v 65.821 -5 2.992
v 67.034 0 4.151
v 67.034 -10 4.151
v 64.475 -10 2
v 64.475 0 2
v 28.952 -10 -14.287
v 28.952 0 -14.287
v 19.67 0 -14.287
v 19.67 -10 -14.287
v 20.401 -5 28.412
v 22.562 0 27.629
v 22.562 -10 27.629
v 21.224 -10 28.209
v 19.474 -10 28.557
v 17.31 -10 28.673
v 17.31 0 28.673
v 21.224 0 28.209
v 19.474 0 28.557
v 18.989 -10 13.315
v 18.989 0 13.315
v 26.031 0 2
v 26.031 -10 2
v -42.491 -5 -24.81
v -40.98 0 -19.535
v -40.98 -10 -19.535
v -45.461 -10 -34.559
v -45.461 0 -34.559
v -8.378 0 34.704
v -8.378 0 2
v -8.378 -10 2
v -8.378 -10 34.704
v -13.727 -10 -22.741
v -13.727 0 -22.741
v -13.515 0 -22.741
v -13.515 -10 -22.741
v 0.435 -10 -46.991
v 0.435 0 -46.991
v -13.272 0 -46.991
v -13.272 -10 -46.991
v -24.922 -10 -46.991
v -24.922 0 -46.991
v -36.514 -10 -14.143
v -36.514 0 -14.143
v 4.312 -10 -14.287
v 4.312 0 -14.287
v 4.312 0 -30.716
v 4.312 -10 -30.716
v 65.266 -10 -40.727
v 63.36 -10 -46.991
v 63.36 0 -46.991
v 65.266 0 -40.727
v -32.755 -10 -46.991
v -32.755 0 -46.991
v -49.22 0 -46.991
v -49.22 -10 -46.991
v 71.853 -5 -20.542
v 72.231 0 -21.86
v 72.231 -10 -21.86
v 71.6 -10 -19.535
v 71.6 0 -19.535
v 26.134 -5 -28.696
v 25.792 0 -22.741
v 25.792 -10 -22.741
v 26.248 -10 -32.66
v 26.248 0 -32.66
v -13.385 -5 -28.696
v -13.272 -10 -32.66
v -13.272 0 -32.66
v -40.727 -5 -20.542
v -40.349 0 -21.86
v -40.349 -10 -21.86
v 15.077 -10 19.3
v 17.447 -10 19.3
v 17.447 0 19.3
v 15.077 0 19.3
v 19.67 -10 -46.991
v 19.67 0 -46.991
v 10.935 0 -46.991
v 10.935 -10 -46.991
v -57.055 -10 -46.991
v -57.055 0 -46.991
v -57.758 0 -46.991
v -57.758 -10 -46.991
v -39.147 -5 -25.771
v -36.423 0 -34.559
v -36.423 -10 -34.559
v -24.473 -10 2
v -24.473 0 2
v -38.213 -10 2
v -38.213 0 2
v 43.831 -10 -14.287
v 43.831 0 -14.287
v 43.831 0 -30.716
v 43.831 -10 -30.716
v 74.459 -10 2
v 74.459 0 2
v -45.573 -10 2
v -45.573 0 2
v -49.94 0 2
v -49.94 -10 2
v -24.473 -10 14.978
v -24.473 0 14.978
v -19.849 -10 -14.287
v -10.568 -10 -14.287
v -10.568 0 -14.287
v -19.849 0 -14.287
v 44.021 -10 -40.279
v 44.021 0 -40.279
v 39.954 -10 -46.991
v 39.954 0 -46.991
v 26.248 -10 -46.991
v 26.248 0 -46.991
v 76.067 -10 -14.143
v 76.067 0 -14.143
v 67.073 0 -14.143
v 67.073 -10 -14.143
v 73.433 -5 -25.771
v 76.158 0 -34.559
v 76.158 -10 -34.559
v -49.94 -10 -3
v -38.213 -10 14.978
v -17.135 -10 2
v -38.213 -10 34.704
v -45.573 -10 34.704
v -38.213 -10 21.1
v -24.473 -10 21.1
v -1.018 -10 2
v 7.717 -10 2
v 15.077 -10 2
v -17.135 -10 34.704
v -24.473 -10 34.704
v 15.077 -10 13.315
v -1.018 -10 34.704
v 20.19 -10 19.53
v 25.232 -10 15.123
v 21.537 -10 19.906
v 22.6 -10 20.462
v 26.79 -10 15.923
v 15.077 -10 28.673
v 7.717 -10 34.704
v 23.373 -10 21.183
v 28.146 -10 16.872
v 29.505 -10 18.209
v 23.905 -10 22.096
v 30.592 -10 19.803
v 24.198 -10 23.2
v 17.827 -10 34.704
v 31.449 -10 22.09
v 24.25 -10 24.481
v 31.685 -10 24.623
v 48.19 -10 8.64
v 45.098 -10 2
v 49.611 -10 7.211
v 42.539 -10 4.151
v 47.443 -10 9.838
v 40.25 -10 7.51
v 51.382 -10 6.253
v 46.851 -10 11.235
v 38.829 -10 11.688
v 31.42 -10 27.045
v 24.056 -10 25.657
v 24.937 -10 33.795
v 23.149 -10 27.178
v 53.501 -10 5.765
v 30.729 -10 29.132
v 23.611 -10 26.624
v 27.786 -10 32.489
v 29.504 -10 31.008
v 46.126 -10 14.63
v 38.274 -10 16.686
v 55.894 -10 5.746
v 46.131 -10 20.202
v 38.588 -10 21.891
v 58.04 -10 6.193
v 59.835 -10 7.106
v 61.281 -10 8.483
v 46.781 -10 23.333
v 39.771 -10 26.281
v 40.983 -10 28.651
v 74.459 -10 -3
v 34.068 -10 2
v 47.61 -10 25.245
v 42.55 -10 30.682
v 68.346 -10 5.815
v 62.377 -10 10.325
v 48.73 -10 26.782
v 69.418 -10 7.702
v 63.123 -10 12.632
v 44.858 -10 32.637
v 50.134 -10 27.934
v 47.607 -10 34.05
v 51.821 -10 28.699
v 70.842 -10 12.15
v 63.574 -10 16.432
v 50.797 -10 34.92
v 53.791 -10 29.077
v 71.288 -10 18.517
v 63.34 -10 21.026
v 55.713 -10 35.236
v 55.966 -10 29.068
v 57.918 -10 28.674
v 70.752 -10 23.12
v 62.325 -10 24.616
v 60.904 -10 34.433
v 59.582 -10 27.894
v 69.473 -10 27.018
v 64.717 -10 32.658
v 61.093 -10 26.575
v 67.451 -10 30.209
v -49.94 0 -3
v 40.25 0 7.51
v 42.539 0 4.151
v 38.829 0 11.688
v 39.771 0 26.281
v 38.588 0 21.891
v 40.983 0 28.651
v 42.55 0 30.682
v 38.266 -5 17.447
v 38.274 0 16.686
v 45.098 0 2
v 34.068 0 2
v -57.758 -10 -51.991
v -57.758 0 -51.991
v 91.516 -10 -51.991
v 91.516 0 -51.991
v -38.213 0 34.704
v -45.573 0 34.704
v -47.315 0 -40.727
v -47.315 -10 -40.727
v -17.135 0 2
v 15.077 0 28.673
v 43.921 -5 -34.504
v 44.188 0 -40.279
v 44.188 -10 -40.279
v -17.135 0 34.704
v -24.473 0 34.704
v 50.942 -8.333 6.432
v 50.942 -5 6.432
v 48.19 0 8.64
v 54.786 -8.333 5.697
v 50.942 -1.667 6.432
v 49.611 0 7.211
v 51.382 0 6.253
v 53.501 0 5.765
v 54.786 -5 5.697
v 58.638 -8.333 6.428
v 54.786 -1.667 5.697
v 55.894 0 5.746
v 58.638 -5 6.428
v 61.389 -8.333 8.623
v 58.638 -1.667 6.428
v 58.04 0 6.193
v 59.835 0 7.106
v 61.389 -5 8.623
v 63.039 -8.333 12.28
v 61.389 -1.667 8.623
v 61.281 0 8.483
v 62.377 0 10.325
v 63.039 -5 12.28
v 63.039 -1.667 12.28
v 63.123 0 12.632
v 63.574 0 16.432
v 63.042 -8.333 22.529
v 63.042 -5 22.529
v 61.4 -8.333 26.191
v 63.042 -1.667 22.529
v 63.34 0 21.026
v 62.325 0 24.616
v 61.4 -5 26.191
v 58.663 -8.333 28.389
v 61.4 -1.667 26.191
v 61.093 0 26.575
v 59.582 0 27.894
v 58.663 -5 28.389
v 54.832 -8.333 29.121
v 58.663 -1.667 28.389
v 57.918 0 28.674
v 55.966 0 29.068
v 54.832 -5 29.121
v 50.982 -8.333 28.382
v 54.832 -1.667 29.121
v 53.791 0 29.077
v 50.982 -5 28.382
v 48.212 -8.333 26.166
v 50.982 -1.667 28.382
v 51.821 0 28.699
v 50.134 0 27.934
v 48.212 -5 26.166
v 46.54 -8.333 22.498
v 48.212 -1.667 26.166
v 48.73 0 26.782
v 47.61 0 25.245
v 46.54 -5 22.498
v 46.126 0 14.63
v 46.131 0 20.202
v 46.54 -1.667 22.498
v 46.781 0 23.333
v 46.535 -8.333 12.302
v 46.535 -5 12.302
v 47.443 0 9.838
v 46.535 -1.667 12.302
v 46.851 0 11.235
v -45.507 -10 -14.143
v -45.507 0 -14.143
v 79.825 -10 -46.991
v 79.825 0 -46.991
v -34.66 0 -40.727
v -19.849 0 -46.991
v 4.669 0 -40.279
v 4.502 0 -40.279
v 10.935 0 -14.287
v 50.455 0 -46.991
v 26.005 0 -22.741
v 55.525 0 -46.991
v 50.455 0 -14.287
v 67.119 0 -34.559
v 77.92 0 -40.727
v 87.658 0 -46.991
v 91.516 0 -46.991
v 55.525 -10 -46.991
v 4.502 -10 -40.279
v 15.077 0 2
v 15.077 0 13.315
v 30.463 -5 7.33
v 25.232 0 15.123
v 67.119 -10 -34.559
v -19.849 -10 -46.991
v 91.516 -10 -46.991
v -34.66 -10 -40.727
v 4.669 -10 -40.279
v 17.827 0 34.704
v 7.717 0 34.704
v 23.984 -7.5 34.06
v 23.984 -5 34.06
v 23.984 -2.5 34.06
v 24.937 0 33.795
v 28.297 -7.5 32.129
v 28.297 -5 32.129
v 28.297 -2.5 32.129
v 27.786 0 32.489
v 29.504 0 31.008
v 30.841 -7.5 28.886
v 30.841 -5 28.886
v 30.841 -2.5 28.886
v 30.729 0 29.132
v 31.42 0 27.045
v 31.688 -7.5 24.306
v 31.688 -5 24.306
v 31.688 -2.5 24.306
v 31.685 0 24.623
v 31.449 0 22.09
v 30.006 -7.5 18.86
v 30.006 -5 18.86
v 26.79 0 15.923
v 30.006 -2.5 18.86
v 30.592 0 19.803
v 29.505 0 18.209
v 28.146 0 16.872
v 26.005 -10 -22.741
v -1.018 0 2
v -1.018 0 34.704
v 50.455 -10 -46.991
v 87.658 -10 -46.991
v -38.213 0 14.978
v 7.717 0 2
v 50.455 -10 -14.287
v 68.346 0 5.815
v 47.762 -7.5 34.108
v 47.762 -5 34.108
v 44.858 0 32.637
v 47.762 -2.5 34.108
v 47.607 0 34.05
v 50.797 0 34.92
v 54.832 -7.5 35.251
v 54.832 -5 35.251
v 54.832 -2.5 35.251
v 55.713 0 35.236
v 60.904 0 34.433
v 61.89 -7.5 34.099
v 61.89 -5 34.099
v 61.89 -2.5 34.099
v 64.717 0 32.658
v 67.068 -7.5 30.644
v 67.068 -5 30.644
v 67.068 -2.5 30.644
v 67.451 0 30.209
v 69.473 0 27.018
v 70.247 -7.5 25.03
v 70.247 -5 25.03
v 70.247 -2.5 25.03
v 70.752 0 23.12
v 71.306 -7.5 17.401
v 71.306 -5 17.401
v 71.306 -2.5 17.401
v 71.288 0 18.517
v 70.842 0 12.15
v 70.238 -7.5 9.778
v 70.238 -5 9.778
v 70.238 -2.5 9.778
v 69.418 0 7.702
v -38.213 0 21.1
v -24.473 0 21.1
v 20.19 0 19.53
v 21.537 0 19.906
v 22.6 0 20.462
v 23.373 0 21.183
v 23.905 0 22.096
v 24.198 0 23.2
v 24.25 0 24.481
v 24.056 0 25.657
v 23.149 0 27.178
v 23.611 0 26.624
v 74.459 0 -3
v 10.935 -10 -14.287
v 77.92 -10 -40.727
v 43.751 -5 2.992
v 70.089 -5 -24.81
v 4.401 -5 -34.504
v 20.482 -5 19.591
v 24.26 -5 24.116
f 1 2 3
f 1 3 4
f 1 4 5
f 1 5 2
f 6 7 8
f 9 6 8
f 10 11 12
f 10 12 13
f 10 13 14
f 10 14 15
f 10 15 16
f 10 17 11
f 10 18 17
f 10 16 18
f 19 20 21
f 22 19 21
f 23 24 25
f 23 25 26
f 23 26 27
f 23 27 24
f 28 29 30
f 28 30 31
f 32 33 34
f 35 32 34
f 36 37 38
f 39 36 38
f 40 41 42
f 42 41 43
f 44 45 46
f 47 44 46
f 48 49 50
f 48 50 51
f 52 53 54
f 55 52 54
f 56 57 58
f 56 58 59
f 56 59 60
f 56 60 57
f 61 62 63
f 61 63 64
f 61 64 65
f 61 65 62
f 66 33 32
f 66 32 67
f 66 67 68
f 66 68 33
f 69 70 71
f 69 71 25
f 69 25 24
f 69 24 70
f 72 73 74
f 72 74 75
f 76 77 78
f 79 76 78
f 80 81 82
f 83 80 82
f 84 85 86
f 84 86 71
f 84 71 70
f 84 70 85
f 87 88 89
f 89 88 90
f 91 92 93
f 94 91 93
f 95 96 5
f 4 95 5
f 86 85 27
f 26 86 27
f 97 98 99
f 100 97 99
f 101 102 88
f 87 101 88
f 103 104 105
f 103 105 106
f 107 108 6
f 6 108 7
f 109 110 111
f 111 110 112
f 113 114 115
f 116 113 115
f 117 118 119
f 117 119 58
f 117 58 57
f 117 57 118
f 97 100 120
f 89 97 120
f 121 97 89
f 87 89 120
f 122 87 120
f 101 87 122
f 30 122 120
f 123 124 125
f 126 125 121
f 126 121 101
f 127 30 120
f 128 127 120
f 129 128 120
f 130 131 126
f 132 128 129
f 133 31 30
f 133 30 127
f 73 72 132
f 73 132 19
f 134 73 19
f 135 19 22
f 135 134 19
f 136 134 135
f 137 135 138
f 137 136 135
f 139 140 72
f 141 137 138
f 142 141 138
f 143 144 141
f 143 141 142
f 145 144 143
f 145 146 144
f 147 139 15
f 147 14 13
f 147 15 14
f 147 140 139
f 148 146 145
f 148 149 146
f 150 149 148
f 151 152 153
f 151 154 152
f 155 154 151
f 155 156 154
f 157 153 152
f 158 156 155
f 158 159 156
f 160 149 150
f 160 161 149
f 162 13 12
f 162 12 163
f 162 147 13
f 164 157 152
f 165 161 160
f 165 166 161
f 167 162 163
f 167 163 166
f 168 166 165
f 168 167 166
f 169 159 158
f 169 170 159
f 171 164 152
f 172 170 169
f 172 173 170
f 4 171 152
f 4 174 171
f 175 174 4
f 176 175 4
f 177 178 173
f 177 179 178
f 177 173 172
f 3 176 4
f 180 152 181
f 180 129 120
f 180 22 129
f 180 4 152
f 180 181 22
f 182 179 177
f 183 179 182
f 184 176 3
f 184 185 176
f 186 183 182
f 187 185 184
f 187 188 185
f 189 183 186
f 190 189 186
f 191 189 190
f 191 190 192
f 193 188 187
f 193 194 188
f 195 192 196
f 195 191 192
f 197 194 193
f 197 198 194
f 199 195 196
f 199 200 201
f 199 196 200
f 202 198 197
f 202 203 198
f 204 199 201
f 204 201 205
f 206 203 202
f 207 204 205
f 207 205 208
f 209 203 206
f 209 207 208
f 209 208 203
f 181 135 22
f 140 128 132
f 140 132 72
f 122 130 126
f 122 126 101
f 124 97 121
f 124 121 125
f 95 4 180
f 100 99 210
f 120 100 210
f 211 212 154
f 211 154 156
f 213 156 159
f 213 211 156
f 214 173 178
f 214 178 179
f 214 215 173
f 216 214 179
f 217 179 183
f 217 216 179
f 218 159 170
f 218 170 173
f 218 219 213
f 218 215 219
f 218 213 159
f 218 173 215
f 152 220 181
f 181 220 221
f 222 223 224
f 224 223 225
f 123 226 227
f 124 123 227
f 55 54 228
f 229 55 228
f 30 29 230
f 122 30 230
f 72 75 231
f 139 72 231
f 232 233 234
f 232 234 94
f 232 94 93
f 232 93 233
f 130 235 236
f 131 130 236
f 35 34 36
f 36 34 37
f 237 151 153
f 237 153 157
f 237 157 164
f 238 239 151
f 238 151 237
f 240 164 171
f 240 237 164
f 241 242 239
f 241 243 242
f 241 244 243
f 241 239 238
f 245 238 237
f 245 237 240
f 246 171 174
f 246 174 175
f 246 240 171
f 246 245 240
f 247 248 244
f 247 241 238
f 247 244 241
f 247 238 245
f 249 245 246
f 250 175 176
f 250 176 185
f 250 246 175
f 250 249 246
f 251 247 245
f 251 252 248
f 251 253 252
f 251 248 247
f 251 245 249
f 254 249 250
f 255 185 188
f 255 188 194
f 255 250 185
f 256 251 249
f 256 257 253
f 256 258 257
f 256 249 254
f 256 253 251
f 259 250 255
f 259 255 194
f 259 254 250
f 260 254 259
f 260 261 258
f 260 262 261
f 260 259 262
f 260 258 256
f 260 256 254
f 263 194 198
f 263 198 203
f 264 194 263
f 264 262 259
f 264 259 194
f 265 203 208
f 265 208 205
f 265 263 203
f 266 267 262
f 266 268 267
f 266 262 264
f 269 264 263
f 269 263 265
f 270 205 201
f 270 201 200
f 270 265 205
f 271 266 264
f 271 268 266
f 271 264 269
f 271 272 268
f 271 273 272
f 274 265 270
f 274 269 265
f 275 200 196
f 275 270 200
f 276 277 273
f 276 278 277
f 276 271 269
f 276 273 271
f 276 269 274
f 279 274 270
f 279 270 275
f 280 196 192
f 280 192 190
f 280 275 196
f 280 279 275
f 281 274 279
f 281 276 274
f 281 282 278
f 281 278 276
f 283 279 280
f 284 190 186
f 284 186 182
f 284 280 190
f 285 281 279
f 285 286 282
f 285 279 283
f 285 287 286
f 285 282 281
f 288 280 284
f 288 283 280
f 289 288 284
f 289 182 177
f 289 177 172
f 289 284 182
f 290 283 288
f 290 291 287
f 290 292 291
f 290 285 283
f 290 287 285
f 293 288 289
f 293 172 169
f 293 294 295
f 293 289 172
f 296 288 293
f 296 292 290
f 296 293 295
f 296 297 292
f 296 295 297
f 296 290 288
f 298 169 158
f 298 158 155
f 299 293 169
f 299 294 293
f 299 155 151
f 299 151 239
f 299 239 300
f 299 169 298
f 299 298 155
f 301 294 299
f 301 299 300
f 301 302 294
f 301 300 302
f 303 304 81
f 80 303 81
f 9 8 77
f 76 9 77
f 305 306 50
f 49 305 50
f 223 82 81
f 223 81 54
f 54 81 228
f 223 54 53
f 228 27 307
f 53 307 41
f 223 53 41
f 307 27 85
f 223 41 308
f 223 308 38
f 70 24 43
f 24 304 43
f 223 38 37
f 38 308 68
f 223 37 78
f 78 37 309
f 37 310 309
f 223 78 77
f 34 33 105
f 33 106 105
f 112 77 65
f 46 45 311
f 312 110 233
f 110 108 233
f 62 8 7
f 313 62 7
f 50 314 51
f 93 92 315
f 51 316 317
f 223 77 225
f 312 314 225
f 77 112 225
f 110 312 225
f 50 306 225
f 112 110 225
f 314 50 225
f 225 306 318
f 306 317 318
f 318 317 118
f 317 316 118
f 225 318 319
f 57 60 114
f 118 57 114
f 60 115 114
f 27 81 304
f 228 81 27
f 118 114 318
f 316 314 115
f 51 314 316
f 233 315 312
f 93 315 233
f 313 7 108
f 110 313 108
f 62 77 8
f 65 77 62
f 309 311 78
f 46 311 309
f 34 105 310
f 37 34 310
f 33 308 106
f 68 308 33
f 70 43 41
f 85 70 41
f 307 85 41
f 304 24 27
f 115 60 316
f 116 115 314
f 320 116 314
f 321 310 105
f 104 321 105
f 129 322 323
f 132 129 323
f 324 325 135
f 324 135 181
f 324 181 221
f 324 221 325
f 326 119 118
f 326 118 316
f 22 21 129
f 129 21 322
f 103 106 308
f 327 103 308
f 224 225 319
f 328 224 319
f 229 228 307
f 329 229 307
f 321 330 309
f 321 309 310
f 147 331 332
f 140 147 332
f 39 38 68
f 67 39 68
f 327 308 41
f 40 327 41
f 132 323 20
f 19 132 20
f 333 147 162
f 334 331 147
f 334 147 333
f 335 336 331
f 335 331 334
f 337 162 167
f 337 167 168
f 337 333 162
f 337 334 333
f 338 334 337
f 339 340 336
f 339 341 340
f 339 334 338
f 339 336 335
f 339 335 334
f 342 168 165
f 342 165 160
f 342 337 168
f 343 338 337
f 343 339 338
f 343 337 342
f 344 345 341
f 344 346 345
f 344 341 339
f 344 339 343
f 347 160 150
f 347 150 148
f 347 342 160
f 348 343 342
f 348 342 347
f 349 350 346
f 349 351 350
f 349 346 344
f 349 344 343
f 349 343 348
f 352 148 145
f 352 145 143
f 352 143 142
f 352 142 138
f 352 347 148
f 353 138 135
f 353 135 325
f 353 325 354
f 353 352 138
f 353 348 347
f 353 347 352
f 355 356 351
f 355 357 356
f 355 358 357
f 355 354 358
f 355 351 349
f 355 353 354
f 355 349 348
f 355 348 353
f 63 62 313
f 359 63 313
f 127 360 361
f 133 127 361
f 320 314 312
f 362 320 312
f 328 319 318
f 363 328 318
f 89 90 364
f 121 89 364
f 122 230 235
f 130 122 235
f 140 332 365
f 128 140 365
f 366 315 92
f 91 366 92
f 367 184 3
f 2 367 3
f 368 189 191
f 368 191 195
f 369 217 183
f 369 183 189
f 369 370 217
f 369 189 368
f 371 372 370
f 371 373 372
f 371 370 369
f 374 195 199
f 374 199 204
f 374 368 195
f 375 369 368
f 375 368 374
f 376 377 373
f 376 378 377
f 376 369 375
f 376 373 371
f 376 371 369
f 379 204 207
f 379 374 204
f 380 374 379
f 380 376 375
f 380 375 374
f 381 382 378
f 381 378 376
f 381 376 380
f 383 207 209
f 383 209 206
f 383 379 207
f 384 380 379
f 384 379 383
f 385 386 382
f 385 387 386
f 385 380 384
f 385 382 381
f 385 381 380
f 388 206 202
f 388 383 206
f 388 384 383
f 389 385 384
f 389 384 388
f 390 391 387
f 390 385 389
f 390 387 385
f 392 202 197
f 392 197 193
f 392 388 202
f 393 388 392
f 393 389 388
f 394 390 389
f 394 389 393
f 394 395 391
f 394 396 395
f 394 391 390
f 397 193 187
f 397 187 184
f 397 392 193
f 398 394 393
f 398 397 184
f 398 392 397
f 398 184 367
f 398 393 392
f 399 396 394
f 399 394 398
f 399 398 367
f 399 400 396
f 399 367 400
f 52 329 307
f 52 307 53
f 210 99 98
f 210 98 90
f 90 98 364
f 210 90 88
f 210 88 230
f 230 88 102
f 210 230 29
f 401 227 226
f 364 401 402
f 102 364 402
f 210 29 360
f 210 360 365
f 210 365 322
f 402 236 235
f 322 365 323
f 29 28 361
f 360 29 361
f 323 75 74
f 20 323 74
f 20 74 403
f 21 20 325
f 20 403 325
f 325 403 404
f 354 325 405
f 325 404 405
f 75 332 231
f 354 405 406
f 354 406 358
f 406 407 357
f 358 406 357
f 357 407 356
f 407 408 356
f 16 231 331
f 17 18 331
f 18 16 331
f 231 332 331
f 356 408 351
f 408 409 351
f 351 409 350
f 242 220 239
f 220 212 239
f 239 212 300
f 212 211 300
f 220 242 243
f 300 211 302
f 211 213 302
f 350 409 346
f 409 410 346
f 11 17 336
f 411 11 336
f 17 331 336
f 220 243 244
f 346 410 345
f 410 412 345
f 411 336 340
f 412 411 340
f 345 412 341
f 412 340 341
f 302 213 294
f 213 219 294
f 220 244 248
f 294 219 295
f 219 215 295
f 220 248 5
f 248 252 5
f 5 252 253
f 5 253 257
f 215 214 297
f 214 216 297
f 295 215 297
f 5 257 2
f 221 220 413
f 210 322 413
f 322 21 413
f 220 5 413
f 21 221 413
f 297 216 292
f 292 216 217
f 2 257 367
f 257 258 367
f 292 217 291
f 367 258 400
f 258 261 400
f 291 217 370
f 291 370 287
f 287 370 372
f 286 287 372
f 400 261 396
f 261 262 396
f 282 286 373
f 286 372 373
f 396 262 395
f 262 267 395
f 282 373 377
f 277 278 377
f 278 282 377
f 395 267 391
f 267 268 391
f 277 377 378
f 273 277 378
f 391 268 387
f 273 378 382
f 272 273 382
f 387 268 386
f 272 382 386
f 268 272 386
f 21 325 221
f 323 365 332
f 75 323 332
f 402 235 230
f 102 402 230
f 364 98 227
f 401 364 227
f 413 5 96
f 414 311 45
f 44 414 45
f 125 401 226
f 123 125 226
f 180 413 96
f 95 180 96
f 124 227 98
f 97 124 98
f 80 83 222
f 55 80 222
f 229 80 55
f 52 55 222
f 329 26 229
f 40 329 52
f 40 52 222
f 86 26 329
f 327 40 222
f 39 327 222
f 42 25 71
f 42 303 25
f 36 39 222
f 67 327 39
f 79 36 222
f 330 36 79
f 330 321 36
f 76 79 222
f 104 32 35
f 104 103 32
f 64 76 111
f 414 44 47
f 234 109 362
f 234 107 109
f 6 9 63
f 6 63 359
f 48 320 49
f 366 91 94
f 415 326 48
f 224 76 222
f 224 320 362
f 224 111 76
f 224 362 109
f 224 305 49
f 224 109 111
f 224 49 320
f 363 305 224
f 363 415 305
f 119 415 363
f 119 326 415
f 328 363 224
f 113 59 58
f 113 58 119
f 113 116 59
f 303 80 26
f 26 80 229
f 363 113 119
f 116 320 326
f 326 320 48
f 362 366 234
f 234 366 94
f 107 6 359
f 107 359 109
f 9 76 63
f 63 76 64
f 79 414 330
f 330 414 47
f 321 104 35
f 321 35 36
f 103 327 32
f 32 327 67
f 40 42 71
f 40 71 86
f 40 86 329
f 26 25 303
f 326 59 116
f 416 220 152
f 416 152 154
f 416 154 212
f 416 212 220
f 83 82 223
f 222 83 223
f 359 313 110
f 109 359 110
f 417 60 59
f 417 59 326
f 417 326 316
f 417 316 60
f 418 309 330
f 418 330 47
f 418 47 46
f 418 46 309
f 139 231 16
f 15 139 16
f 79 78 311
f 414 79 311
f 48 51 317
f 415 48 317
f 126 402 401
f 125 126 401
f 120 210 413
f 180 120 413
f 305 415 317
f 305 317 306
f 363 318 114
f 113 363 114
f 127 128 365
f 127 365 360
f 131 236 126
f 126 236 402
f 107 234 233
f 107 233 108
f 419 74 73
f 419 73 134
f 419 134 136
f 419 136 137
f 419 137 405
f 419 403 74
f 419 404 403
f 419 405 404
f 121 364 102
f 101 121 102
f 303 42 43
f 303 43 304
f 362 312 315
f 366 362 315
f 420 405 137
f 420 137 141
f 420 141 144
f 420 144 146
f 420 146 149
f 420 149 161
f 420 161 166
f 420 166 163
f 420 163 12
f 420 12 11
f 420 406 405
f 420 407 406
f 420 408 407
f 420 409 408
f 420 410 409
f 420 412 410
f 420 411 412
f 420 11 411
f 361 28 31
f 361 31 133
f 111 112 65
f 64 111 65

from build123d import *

# Parameters (mm, degrees)
F0_W     = 7.3600260417
F0_H     = 2
F0_W_2   = 7.3372395833
F0_H_2   = 32.7037760417
F1_DEPTH = 10
F2_W     = 6.5776909722
F2_H     = 2
F3_DEPTH = 10


with BuildPart() as f1:
    # F0 (on Front) → F1 (new body)
    with BuildSketch(Plane.XZ):
        Polygon((-45.5729096715, 34.7037760417), (-45.5729096715, 2), (-38.2128836299, 2), (-38.2128836299, 14.9782986111), (-24.4726492549, 14.9782986111), (-24.4726492549, 2), (-17.1354096715, 2), (-17.1354096715, 34.7037760417), (-24.4726492549, 34.7037760417), (-24.4726492549, 21.1002604167), (-38.2128836299, 21.1002604167), (-38.2128836299, 34.7037760417), align=None)
        with Locations((-41.8928966507, 1)):
            Rectangle(F0_W, F0_H)
        with BuildLine():
            Line((-45.5729096715, 2), (-49.9403141854, 2))
            Line((-49.9403141854, 2), (-49.9403141854, -3))
            Line((-49.9403141854, -3), (74.4585573424, -3))
            Line((74.4585573424, -3), (74.4585573424, 2))
            Line((74.4585573424, 2), (64.4747883987, 2))
            add(Edge.make_bspline(
                [(64.4747883987, 2), (60.6217212829, -0.478515625), (54.7862483146, -0.478515625)],
                knots=[0.2683031445, 0.2683031445, 0.2683031445, 1, 1, 1], degree=2))
            add(Edge.make_bspline(
                [(54.7862483146, -0.478515625), (48.9507753462, -0.478515625), (45.0977082305, 2)],
                knots=[0, 0, 0, 0.7316968555, 0.7316968555, 0.7316968555], degree=2))
            Line((45.0977082305, 2), (34.0683879111, 2))
            add(Edge.make_bspline(
                [(34.0683879111, 2), (34.8978609429, 0.7827176635), (35.4405451896, 0)],
                knots=[0.770999175, 0.770999175, 0.770999175, 1, 1, 1], degree=2))
            Line((35.4405451896, 0), (27.2753976201, 0))
            Line((27.2753976201, 0), (26.0306742887, 2))
            Line((26.0306742887, 2), (15.0770469257, 2))
            Line((15.0770469257, 2), (15.0770469257, 0))
            Line((15.0770469257, 0), (7.717020884, 0))
            Line((7.717020884, 0), (7.717020884, 2))
            Line((7.717020884, 2), (-1.0177881438, 2))
            Line((-1.0177881438, 2), (-1.0177881438, 0))
            Line((-1.0177881438, 0), (-8.3778141854, 0))
            Line((-8.3778141854, 0), (-8.3778141854, 2))
            Line((-8.3778141854, 2), (-17.1354096715, 2))
            Line((-17.1354096715, 2), (-17.1354096715, 0))
            Line((-17.1354096715, 0), (-24.4726492549, 0))
            Line((-24.4726492549, 0), (-24.4726492549, 2))
            Line((-24.4726492549, 2), (-38.2128836299, 2))
            Line((-38.2128836299, 2), (-38.2128836299, 0))
            Line((-38.2128836299, 0), (-45.5729096715, 0))
            Line((-45.5729096715, 0), (-45.5729096715, 2))
        make_face()
        with Locations((-20.8040294632, 1)):
            Rectangle(F0_W_2, F0_H)
        with Locations((-4.6978011646, 18.3518880208)):
            Rectangle(F0_W, F0_H_2)
        with Locations((-4.6978011646, 1)):
            Rectangle(F0_W, F0_H)
        with BuildLine():
            Line((26.0306742887, 2), (34.0683879111, 2))
            add(Edge.make_bspline(
                [(25.2322118562, 15.1226128472), (31.2757210146, 6.0983419044), (34.0683879111, 2)],
                knots=[0, 0, 0, 0.770999175, 0.770999175, 0.770999175], degree=2))
            add(Edge.make_bspline(
                [(30.0059748771, 18.8595920139), (28.3235747035, 16.474609375), (25.2322118562, 15.1226128472)],
                knots=[0, 0, 0, 1, 1, 1], degree=2))
            add(Edge.make_bspline(
                [(31.6883750507, 24.3055555556), (31.6883750507, 21.2445746528), (30.0059748771, 18.8595920139)],
                knots=[0, 0, 0, 1, 1, 1], degree=2))
            add(Edge.make_bspline(
                [(28.2969905021, 32.12890625), (31.6883750507, 29.5540364583), (31.6883750507, 24.3055555556)],
                knots=[0, 0, 0, 1, 1, 1], degree=2))
            add(Edge.make_bspline(
                [(17.8266128979, 34.7037760417), (24.9056059535, 34.7037760417), (28.2969905021, 32.12890625)],
                knots=[0, 0, 0, 1, 1, 1], degree=2))
            Line((17.8266128979, 34.7037760417), (7.717020884, 34.7037760417))
            Line((7.717020884, 34.7037760417), (7.717020884, 2))
            Line((7.717020884, 2), (15.0770469257, 2))
            Line((15.0770469257, 2), (15.0770469257, 13.3148871528))
            Line((15.0770469257, 13.3148871528), (18.9887222729, 13.3148871528))
            Line((18.9887222729, 13.3148871528), (26.0306742887, 2))
        make_face()
        with BuildLine():
            Line((17.4468385924, 19.3001302083), (15.0770469257, 19.3001302083))
            Line((15.0770469257, 19.3001302083), (15.0770469257, 28.6729600694))
            Line((15.0770469257, 28.6729600694), (17.3101198424, 28.6729600694))
            add(Edge.make_bspline(
                [(22.5623984882, 27.6285807292), (20.8648073424, 28.6729600694), (17.3101198424, 28.6729600694)],
                knots=[0, 0, 0, 1, 1, 1], degree=2))
            add(Edge.make_bspline(
                [(24.259989634, 24.1156684028), (24.259989634, 26.5842013889), (22.5623984882, 27.6285807292)],
                knots=[0, 0, 0, 1, 1, 1], degree=2))
            add(Edge.make_bspline(
                [(22.6003759187, 20.4622395833), (24.259989634, 21.6243489583), (24.259989634, 24.1156684028)],
                knots=[0, 0, 0, 1, 1, 1], degree=2))
            add(Edge.make_bspline(
                [(17.4468385924, 19.3001302083), (20.9407622035, 19.3001302083), (22.6003759187, 20.4622395833)],
                knots=[0, 0, 0, 1, 1, 1], degree=2))
        make_face(mode=Mode.SUBTRACT)
        with Locations((11.3970339049, 1)):
            Rectangle(F0_W, F0_H)
        with BuildLine():
            add(Edge.make_bspline(
                [(34.0683879111, 2), (34.8978609429, 0.7827176635), (35.4405451896, 0)],
                knots=[0.770999175, 0.770999175, 0.770999175, 1, 1, 1], degree=2))
            Line((34.0683879111, 2), (26.0306742887, 2))
            Line((26.0306742887, 2), (27.2753976201, 0))
            Line((27.2753976201, 0), (35.4405451896, 0))
        make_face()
        with BuildLine():
            Line((45.0977082305, 2), (64.4747883987, 2))
            add(Edge.make_bspline(
                [(67.0339696687, 4.1509331597), (65.8876549643, 2.9088374933), (64.4747883987, 2)],
                knots=[0, 0, 0, 0.2683031445, 0.2683031445, 0.2683031445], degree=2))
            add(Edge.make_bspline(
                [(71.3064306062, 17.4012586806), (71.3064306062, 8.7803819444), (67.0339696687, 4.1509331597)],
                knots=[0, 0, 0, 1, 1, 1], degree=2))
            add(Edge.make_bspline(
                [(67.0681493562, 30.6439887153), (71.3064306062, 26.0373263889), (71.3064306062, 17.4012586806)],
                knots=[0, 0, 0, 1, 1, 1], degree=2))
            add(Edge.make_bspline(
                [(54.8318212312, 35.2506510417), (62.8298681062, 35.2506510417), (67.0681493562, 30.6439887153)],
                knots=[0, 0, 0, 1, 1, 1], degree=2))
            add(Edge.make_bspline(
                [(42.5499201896, 30.6819661458), (46.8337743562, 35.2506510417), (54.8318212312, 35.2506510417)],
                knots=[0, 0, 0, 1, 1, 1], degree=2))
            add(Edge.make_bspline(
                [(38.2660660229, 17.4468315972), (38.2660660229, 26.11328125), (42.5499201896, 30.6819661458)],
                knots=[0, 0, 0, 1, 1, 1], degree=2))
            add(Edge.make_bspline(
                [(42.5385269604, 4.1509331597), (38.2660660229, 8.7803819444), (38.2660660229, 17.4468315972)],
                knots=[0, 0, 0, 1, 1, 1], degree=2))
            add(Edge.make_bspline(
                [(45.0977082305, 2), (43.6848416649, 2.9088374933), (42.5385269604, 4.1509331597)],
                knots=[0.7316968555, 0.7316968555, 0.7316968555, 1, 1, 1], degree=2))
        make_face()
        with BuildLine():
            add(Edge.make_bspline(
                [(45.9830799118, 17.4012586806), (45.9830799118, 11.5831163194), (48.1895686271, 8.6398654514)],
                knots=[0, 0, 0, 1, 1, 1], degree=2))
            add(Edge.make_bspline(
                [(48.2123550854, 26.1664496528), (45.9830799118, 23.2118055556), (45.9830799118, 17.4012586806)],
                knots=[0, 0, 0, 1, 1, 1], degree=2))
            add(Edge.make_bspline(
                [(54.8318212312, 29.12109375), (50.441630259, 29.12109375), (48.2123550854, 26.1664496528)],
                knots=[0, 0, 0, 1, 1, 1], degree=2))
            add(Edge.make_bspline(
                [(63.5894167174, 17.4012586806), (63.5894167174, 29.12109375), (54.8318212312, 29.12109375)],
                knots=[0, 0, 0, 1, 1, 1], degree=2))
            add(Edge.make_bspline(
                [(54.7862483146, 5.6966145833), (63.5894167174, 5.6966145833), (63.5894167174, 17.4012586806)],
                knots=[0, 0, 0, 1, 1, 1], degree=2))
            add(Edge.make_bspline(
                [(48.1895686271, 8.6398654514), (50.3960573424, 5.6966145833), (54.7862483146, 5.6966145833)],
                knots=[0, 0, 0, 1, 1, 1], degree=2))
        make_face(mode=Mode.SUBTRACT)
        with BuildLine():
            add(Edge.make_bspline(
                [(64.4747883987, 2), (60.6217212829, -0.478515625), (54.7862483146, -0.478515625)],
                knots=[0.2683031445, 0.2683031445, 0.2683031445, 1, 1, 1], degree=2))
            Line((64.4747883987, 2), (45.0977082305, 2))
            add(Edge.make_bspline(
                [(54.7862483146, -0.478515625), (48.9507753462, -0.478515625), (45.0977082305, 2)],
                knots=[0, 0, 0, 0.7316968555, 0.7316968555, 0.7316968555], degree=2))
        make_face()
    extrude(amount=F1_DEPTH)


with BuildPart() as f3:
    # F2 (on Front) → F3 (new body)
    with BuildSketch(Plane.XZ):
        Polygon((-45.5068036232, -14.1426085562), (-57.0551840979, -46.9906988339), (-49.2201793381, -46.9906988339), (-47.3145293176, -40.7268099451), (-34.6604494565, -40.7268099451), (-32.7547994361, -46.9906988339), (-24.922410195, -46.9906988339), (-36.5137480676, -14.1426085562), align=None)
        with BuildLine():
            add(Edge.make_bspline(
                [(-36.4226022343, -34.5592752228), (-39.9089303593, -23.3331467506), (-40.3494685538, -21.8596224451)],
                knots=[0, 0, 0, 1, 1, 1], degree=2))
            Line((-36.4226022343, -34.5592752228), (-45.4612307065, -34.5592752228))
            add(Edge.make_bspline(
                [(-40.979893901, -19.5354036951), (-41.7622289704, -22.5735981395), (-45.4612307065, -34.5592752228)],
                knots=[0, 0, 0, 1, 1, 1], degree=2))
            add(Edge.make_bspline(
                [(-40.3494685538, -21.8596224451), (-40.7900067482, -20.3860981395), (-40.979893901, -19.5354036951)],
                knots=[0, 0, 0, 1, 1, 1], degree=2))
        make_face(mode=Mode.SUBTRACT)
        with BuildLine():
            Line((-19.8492515399, -14.2869227923), (-19.8492515399, -46.9906988339))
            Line((-19.8492515399, -46.9906988339), (-13.2715605676, -46.9906988339))
            Line((-13.2715605676, -46.9906988339), (-13.2715605676, -32.6604036951))
            add(Edge.make_bspline(
                [(-13.7272897343, -22.7406988339), (-13.2715605676, -29.6905686256), (-13.2715605676, -32.6604036951)],
                knots=[0, 0, 0, 1, 1, 1], degree=2))
            Line((-13.7272897343, -22.7406988339), (-13.5146161232, -22.7406988339))
            Line((-13.5146161232, -22.7406988339), (0.4347473027, -46.9906988339))
            Line((0.4347473027, -46.9906988339), (10.9352536685, -46.9906988339))
            Line((10.9352536685, -46.9906988339), (10.9352536685, -14.2869227923))
            Line((10.9352536685, -14.2869227923), (4.3119897796, -14.2869227923))
            Line((4.3119897796, -14.2869227923), (4.3119897796, -30.7159592506))
            add(Edge.make_bspline(
                [(4.6689776268, -40.2786762645), (4.3119897796, -33.5110981395), (4.3119897796, -30.7159592506)],
                knots=[0, 0, 0, 1, 1, 1], degree=2))
            Line((4.6689776268, -40.2786762645), (4.5018769324, -40.2786762645))
            Line((4.5018769324, -40.2786762645), (-10.5675675121, -14.2869227923))
            Line((-10.5675675121, -14.2869227923), (-19.8492515399, -14.2869227923))
        make_face()
        with BuildLine():
            Line((19.6700626962, -14.2869227923), (19.6700626962, -46.9906988339))
            Line((19.6700626962, -46.9906988339), (26.2477536685, -46.9906988339))
            Line((26.2477536685, -46.9906988339), (26.2477536685, -32.6604036951))
            add(Edge.make_bspline(
                [(25.7920245018, -22.7406988339), (26.2477536685, -29.6905686256), (26.2477536685, -32.6604036951)],
                knots=[0, 0, 0, 1, 1, 1], degree=2))
            Line((25.7920245018, -22.7406988339), (26.0046981129, -22.7406988339))
            Line((26.0046981129, -22.7406988339), (39.9540615388, -46.9906988339))
            Line((39.9540615388, -46.9906988339), (50.4545679046, -46.9906988339))
            Line((50.4545679046, -46.9906988339), (50.4545679046, -14.2869227923))
            Line((50.4545679046, -14.2869227923), (43.8313040157, -14.2869227923))
            Line((43.8313040157, -14.2869227923), (43.8313040157, -30.7159592506))
            add(Edge.make_bspline(
                [(44.1882918629, -40.2786762645), (43.8313040157, -33.5110981395), (43.8313040157, -30.7159592506)],
                knots=[0, 0, 0, 1, 1, 1], degree=2))
            Line((44.1882918629, -40.2786762645), (44.0211911685, -40.2786762645))
            Line((44.0211911685, -40.2786762645), (28.951746724, -14.2869227923))
            Line((28.951746724, -14.2869227923), (19.6700626962, -14.2869227923))
        make_face()
        Polygon((79.8254957028, -46.9906988339), (87.6578849439, -46.9906988339), (76.0665470712, -14.1426085562), (67.0734915157, -14.1426085562), (55.525111041, -46.9906988339), (63.3601158008, -46.9906988339), (65.2657658212, -40.7268099451), (77.9198456824, -40.7268099451), align=None)
        with BuildLine():
            add(Edge.make_bspline(
                [(76.1576929046, -34.5592752228), (72.6713647796, -23.3331467506), (72.2308265851, -21.8596224451)],
                knots=[0, 0, 0, 1, 1, 1], degree=2))
            Line((76.1576929046, -34.5592752228), (67.1190644324, -34.5592752228))
            add(Edge.make_bspline(
                [(71.6004012379, -19.5354036951), (70.8180661685, -22.5735981395), (67.1190644324, -34.5592752228)],
                knots=[0, 0, 0, 1, 1, 1], degree=2))
            add(Edge.make_bspline(
                [(72.2308265851, -21.8596224451), (71.7902883907, -20.3860981395), (71.6004012379, -19.5354036951)],
                knots=[0, 0, 0, 1, 1, 1], degree=2))
        make_face(mode=Mode.SUBTRACT)
        Polygon((88.3636390851, -48.9906988339), (87.6578849439, -46.9906988339), (79.8254957028, -46.9906988339), (80.4339515851, -48.9906988339), align=None)
        Polygon((-49.8286352204, -48.9906988339), (-57.7583227204, -48.9906988339), (-57.7583227204, -51.9906988339), (91.5157658212, -51.9906988339), (91.5157658212, -46.9906988339), (87.6578849439, -46.9906988339), (88.3636390851, -48.9906988339), (80.4339515851, -48.9906988339), (79.8254957028, -46.9906988339), (63.3601158008, -46.9906988339), (62.7516599185, -48.9906988339), (54.8219724185, -48.9906988339), (55.525111041, -46.9906988339), (50.4545679046, -46.9906988339), (50.4545679046, -48.9906988339), (41.1045245018, -48.9906988339), (39.9540615388, -46.9906988339), (26.2477536685, -46.9906988339), (26.2477536685, -48.9906988339), (19.6700626962, -48.9906988339), (19.6700626962, -46.9906988339), (10.9352536685, -46.9906988339), (10.9352536685, -48.9906988339), (1.5852102657, -48.9906988339), (0.4347473027, -46.9906988339), (-13.2715605676, -46.9906988339), (-13.2715605676, -48.9906988339), (-19.8492515399, -48.9906988339), (-19.8492515399, -46.9906988339), (-24.922410195, -46.9906988339), (-24.2166560538, -48.9906988339), (-32.1463435538, -48.9906988339), (-32.7547994361, -46.9906988339), (-49.2201793381, -46.9906988339), align=None)
        Polygon((62.7516599185, -48.9906988339), (63.3601158008, -46.9906988339), (55.525111041, -46.9906988339), (54.8219724185, -48.9906988339), align=None)
        Polygon((50.4545679046, -48.9906988339), (50.4545679046, -46.9906988339), (39.9540615388, -46.9906988339), (41.1045245018, -48.9906988339), align=None)
        with Locations((22.9589081824, -47.9906988339)):
            Rectangle(F2_W, F2_H)
        Polygon((10.9352536685, -46.9906988339), (0.4347473027, -46.9906988339), (1.5852102657, -48.9906988339), (10.9352536685, -48.9906988339), align=None)
        with Locations((-16.5604060538, -47.9906988339)):
            Rectangle(F2_W, F2_H)
        Polygon((-24.922410195, -46.9906988339), (-32.7547994361, -46.9906988339), (-32.1463435538, -48.9906988339), (-24.2166560538, -48.9906988339), align=None)
        Polygon((-49.2201793381, -46.9906988339), (-57.0551840979, -46.9906988339), (-57.7583227204, -48.9906988339), (-49.8286352204, -48.9906988339), align=None)
        Polygon((-57.0551840979, -46.9906988339), (-57.7583227204, -46.9906988339), (-57.7583227204, -48.9906988339), align=None)
    extrude(amount=F3_DEPTH)


solid = Compound([f1.part, f3.part])
